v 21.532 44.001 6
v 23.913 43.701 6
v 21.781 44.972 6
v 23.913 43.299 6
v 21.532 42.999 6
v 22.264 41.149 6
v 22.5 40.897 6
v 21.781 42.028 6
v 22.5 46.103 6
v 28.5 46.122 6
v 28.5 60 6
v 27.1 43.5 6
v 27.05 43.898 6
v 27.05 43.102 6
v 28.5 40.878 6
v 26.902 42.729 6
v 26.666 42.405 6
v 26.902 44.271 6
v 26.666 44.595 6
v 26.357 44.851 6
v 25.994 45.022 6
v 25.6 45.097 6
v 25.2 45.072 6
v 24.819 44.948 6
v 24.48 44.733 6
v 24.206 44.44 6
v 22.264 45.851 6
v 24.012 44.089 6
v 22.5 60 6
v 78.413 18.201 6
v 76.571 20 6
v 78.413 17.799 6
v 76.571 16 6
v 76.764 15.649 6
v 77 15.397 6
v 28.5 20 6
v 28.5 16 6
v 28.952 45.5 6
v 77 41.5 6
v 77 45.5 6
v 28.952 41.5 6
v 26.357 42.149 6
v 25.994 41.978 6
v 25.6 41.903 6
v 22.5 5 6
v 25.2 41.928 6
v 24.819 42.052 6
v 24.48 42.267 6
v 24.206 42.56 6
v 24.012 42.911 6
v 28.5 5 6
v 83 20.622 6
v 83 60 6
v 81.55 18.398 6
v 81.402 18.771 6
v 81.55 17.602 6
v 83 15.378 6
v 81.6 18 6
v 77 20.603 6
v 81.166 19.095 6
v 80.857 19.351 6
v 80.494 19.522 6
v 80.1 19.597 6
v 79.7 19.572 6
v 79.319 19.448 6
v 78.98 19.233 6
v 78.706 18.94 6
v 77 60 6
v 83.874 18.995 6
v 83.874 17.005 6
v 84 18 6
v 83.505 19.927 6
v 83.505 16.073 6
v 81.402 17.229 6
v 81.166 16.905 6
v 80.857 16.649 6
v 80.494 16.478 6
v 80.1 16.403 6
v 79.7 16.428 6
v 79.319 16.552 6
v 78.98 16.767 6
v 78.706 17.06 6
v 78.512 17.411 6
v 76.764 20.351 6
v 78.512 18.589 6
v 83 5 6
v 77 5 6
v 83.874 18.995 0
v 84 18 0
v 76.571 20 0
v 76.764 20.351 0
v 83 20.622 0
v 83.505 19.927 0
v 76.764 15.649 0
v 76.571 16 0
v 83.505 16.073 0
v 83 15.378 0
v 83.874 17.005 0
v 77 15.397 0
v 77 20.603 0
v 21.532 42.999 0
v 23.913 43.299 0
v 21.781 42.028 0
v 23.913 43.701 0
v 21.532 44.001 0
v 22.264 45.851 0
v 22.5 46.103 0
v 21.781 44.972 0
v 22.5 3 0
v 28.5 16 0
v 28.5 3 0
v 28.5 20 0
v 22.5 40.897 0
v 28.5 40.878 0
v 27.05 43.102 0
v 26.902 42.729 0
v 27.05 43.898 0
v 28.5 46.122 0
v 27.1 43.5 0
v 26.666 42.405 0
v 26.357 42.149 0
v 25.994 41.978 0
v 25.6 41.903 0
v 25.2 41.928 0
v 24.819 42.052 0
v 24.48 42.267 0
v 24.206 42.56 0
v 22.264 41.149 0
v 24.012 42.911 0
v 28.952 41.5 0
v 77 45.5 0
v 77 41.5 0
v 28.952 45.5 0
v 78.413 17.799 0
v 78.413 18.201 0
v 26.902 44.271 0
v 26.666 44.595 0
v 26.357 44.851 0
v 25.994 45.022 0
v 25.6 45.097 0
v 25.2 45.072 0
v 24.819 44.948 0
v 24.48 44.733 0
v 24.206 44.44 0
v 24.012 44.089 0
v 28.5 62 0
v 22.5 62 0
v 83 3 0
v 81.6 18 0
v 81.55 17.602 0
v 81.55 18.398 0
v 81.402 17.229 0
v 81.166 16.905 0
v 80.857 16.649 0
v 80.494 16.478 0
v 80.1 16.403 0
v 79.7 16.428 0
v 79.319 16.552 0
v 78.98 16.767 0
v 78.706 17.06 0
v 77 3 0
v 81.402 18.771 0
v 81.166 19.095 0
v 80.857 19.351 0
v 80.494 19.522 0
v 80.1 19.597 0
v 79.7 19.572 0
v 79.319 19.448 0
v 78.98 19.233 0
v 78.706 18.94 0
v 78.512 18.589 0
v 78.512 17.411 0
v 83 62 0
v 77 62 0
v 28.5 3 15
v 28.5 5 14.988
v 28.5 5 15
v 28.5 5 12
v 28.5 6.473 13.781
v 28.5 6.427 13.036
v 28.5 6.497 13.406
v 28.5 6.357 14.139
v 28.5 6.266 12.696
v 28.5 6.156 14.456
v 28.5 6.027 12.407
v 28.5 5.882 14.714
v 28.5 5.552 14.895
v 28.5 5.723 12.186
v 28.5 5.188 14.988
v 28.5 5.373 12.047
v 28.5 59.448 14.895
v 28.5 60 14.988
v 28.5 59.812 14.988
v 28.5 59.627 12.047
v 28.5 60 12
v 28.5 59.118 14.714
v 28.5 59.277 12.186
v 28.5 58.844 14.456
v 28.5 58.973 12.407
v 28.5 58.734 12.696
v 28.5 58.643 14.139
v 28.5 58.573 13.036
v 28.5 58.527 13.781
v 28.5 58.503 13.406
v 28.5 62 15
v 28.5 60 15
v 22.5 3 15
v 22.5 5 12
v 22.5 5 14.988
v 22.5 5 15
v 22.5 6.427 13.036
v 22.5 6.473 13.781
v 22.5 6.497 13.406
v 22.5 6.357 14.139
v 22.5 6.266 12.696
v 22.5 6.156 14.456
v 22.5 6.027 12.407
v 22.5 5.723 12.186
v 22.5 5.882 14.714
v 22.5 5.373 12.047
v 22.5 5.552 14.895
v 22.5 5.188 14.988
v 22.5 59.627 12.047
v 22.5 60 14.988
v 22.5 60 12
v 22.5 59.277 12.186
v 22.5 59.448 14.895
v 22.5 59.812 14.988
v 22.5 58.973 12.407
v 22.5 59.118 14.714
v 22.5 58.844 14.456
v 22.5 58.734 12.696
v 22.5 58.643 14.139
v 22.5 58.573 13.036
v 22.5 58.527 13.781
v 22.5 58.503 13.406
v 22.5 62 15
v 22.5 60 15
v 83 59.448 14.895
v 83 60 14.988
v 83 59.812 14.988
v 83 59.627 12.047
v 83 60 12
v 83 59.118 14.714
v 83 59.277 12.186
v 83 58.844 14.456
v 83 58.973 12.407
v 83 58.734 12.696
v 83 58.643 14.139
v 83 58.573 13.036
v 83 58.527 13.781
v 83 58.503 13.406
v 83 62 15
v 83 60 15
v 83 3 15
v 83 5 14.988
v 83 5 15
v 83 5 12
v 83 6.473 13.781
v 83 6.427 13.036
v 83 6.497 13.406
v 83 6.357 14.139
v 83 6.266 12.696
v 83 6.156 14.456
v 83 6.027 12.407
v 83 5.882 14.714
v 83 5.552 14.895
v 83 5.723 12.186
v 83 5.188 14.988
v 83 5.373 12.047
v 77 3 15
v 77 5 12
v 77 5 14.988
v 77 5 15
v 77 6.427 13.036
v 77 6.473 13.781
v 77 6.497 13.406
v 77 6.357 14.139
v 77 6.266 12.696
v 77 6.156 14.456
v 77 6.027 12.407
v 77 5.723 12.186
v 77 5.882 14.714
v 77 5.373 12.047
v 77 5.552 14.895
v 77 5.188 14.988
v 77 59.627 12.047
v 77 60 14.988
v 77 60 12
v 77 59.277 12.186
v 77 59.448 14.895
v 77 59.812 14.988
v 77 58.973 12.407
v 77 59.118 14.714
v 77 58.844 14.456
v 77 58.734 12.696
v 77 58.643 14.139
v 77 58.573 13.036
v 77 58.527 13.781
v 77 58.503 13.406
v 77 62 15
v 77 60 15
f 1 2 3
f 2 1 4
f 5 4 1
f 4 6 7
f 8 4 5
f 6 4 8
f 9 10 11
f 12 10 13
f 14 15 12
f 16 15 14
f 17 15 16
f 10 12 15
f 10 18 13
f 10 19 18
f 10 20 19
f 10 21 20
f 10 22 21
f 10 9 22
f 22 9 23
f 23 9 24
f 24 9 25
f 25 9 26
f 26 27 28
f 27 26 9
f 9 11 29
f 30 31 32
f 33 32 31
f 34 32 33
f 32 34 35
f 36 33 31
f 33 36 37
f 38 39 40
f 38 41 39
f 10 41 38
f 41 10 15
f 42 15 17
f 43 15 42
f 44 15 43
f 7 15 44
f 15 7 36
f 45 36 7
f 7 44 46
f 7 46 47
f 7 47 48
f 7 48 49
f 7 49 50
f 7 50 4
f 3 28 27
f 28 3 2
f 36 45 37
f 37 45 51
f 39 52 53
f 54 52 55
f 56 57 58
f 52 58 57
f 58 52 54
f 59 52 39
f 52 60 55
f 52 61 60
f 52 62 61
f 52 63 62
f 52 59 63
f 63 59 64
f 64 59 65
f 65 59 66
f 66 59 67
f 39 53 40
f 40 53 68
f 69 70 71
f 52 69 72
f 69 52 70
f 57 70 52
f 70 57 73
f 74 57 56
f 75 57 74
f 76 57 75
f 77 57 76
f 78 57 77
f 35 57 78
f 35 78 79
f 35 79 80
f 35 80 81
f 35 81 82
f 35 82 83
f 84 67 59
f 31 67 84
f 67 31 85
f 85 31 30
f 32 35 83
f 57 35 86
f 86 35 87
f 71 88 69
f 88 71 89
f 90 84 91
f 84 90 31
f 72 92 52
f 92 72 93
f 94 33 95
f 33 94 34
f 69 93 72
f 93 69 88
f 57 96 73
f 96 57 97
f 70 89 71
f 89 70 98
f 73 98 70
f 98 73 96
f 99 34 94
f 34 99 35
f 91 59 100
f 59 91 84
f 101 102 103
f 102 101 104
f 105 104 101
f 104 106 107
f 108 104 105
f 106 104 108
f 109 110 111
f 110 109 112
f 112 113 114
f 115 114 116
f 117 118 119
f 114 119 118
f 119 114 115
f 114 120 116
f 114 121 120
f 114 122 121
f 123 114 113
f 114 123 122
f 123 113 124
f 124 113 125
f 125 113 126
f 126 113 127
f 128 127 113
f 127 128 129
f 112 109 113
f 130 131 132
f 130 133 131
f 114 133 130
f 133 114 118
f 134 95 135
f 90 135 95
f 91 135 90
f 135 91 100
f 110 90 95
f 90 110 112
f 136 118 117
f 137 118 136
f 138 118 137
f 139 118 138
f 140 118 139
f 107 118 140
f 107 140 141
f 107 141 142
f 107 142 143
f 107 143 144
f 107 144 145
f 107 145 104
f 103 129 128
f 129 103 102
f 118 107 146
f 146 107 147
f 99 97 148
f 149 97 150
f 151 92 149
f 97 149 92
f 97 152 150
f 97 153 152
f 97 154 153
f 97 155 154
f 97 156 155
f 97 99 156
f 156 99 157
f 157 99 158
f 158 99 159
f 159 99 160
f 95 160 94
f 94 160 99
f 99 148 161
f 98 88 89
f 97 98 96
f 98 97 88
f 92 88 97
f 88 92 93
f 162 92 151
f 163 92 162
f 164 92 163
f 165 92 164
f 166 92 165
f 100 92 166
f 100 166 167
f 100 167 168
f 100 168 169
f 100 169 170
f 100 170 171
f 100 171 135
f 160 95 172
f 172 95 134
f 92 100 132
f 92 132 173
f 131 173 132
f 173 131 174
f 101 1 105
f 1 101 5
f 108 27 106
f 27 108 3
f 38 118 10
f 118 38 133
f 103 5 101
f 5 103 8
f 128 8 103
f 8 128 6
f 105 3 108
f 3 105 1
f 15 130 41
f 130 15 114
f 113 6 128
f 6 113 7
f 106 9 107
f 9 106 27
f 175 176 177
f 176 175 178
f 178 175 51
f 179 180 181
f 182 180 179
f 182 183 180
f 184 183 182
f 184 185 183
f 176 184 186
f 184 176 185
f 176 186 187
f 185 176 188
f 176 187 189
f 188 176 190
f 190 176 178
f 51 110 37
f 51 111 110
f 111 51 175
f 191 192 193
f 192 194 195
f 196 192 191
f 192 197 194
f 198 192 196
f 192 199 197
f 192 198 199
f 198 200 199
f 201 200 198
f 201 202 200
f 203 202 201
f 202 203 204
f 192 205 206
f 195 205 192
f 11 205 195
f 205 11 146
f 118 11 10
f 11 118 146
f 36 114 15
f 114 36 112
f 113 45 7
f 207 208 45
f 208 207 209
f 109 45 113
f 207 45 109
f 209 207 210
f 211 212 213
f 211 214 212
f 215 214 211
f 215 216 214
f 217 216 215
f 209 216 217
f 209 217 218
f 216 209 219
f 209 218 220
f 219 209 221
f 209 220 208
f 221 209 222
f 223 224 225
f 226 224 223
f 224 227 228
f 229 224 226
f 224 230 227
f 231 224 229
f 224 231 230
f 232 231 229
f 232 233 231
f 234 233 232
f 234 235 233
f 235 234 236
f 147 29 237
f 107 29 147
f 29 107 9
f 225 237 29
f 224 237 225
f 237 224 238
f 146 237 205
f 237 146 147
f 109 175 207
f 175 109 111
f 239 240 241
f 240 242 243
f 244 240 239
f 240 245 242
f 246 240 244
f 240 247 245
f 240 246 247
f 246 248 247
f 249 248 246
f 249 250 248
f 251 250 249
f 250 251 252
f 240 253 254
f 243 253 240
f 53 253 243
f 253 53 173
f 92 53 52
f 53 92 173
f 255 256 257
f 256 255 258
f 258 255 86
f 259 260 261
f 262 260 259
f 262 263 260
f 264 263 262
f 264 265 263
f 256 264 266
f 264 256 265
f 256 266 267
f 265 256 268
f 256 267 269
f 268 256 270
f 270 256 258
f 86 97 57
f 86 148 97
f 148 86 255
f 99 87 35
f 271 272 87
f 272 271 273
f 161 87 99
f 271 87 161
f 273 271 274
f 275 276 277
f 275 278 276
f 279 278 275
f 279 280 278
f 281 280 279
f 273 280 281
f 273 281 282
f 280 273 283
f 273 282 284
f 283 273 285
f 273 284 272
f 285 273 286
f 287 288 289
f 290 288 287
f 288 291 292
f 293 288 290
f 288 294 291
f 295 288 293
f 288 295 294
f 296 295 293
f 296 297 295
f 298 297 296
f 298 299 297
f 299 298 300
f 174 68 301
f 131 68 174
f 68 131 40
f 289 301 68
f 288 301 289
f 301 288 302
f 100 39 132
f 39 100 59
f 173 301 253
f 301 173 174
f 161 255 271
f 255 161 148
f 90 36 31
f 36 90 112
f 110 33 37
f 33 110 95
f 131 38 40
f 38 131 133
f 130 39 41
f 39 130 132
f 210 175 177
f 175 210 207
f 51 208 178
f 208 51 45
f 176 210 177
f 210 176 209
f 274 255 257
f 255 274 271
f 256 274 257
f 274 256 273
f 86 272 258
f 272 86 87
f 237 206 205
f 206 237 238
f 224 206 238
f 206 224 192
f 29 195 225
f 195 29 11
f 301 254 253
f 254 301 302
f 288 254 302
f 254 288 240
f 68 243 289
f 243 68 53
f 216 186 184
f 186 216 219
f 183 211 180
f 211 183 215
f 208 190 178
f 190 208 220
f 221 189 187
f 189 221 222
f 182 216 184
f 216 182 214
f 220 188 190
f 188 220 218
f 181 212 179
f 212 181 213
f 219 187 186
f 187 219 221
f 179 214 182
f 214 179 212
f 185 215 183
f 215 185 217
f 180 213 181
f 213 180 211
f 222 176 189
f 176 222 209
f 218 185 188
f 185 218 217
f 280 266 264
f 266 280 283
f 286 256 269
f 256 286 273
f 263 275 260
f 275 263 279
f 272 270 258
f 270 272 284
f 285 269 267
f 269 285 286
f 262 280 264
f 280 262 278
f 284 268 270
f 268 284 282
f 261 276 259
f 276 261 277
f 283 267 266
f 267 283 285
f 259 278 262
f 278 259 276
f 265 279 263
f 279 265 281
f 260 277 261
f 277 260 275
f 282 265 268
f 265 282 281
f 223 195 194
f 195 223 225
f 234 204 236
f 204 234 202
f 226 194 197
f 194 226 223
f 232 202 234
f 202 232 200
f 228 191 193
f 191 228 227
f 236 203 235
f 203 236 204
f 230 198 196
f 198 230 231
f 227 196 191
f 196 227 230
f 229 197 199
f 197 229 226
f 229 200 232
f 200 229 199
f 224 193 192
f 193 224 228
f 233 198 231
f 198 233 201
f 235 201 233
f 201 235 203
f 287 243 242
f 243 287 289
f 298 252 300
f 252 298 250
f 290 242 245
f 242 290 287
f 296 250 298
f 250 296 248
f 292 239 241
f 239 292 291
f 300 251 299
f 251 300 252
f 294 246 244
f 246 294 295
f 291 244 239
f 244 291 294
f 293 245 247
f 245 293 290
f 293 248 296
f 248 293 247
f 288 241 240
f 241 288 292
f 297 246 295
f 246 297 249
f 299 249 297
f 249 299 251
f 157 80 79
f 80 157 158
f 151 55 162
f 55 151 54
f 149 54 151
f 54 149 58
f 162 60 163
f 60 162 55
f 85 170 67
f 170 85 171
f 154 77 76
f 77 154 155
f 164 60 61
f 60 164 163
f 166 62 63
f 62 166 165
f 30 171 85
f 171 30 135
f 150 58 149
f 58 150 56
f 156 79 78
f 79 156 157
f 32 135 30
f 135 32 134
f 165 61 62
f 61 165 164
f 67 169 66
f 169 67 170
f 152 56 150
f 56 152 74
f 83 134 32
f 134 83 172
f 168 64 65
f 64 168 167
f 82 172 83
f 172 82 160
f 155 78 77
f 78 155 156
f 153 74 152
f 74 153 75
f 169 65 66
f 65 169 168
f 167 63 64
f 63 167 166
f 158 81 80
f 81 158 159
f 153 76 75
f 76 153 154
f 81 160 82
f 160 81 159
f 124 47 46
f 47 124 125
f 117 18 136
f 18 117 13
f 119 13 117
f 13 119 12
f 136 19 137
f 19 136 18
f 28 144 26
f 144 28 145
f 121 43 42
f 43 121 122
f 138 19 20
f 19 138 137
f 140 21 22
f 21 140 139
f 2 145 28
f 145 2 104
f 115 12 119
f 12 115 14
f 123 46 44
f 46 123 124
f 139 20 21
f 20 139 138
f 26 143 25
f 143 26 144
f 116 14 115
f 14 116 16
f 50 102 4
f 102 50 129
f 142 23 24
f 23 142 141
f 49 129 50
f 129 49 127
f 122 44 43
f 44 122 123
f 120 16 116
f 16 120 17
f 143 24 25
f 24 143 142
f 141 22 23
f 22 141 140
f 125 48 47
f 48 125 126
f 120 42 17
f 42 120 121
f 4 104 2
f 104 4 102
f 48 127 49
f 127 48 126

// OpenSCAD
//Mark Benson
// CC NC 2013
//
//Raspberry Pi mount for Aluminium frame (6mm) Prusa i3
//
//



translate([0,0,0]) 
rotate(a=0, v=[0,0,0]) 
difference()
{
	union()
	{
	

	//Mounting pads
	color("green") translate([80,18,0]) rotate(a=0, v=[0,0,0]) cylinder(r=4, h=6, $fn=25);
	color("green") translate([25.5,43.5,0]) rotate(a=0, v=[0,0,0]) cylinder(r=4, h=6, $fn=25);


	//Frame

	//Vertical parts
	translate([25.5-3,3,0]) rotate([0,0,0]) cube([6,59,6]);
	translate([80-3,3,0]) rotate([0,0,0]) cube([6,59,6]);

	//Horizontal parts
	translate([25.5,18-2,0]) rotate([0,0,0]) cube([54.5,4,6]);
	translate([25.5,56-12.5-2,0]) rotate([0,0,0]) cube([54.5,4,6]);

	//Pi Clips
	
	//Uprights
	translate([25.5-3,3,0]) rotate([0,0,0]) cube([6,2,15]);
	translate([80-3,3,0]) rotate([0,0,0]) cube([6,2,15]);
	translate([25.5-3,60,0]) rotate([0,0,0]) cube([6,2,15]);
	translate([80-3,60,0]) rotate([0,0,0]) cube([6,2,15]);	

	//Clips
	color("red") translate([25.5-3,5,13.5]) rotate(a=90, v=[0,1,0]) cylinder(r=1.5, h=6, $fn=25);
	color("red") translate([80-3,5,13.5]) rotate(a=90, v=[0,1,0]) cylinder(r=1.5, h=6, $fn=25);
	color("red") translate([25.5-3,60,13.5]) rotate(a=90, v=[0,1,0]) cylinder(r=1.5, h=6, $fn=25);
	color("red") translate([80-3,60,13.5]) rotate(a=90, v=[0,1,0]) cylinder(r=1.5, h=6, $fn=25);

	//Spacer pads
	//color("green") translate([40,30,0]) rotate(a=0, v=[0,0,0]) cylinder(r=3, h=3, $fn=25);
	//color("green") translate([60,30,0]) rotate(a=0, v=[0,0,0]) cylinder(r=3, h=3, $fn=25);

	}

	union()
	{
	
	//Mounting holes
	color("red") translate([80,18,-1]) rotate(a=0, v=[0,0,0]) cylinder(r=1.6, h=10, $fn=25);
	color("red") translate([25.5,43.5,-1]) rotate(a=0, v=[0,0,0]) cylinder(r=1.6, h=10, $fn=25);

	//Countersink holes
	//color("red") translate([80,18,3]) rotate(a=0, v=[0,0,0]) cylinder(r=3, h=4, $fn=25);
	//color("red") translate([25.5,43.5,3]) rotate(a=0, v=[0,0,0]) cylinder(r=3, h=4, $fn=25);

	//Spacer pad holes
	//color("red") translate([40,30,-1]) rotate(a=0, v=[0,0,0]) cylinder(r=1.5, h=10, $fn=25);
	//color("red") translate([60,30,-1]) rotate(a=0, v=[0,0,0]) cylinder(r=1.5, h=10, $fn=25);


	}
}
